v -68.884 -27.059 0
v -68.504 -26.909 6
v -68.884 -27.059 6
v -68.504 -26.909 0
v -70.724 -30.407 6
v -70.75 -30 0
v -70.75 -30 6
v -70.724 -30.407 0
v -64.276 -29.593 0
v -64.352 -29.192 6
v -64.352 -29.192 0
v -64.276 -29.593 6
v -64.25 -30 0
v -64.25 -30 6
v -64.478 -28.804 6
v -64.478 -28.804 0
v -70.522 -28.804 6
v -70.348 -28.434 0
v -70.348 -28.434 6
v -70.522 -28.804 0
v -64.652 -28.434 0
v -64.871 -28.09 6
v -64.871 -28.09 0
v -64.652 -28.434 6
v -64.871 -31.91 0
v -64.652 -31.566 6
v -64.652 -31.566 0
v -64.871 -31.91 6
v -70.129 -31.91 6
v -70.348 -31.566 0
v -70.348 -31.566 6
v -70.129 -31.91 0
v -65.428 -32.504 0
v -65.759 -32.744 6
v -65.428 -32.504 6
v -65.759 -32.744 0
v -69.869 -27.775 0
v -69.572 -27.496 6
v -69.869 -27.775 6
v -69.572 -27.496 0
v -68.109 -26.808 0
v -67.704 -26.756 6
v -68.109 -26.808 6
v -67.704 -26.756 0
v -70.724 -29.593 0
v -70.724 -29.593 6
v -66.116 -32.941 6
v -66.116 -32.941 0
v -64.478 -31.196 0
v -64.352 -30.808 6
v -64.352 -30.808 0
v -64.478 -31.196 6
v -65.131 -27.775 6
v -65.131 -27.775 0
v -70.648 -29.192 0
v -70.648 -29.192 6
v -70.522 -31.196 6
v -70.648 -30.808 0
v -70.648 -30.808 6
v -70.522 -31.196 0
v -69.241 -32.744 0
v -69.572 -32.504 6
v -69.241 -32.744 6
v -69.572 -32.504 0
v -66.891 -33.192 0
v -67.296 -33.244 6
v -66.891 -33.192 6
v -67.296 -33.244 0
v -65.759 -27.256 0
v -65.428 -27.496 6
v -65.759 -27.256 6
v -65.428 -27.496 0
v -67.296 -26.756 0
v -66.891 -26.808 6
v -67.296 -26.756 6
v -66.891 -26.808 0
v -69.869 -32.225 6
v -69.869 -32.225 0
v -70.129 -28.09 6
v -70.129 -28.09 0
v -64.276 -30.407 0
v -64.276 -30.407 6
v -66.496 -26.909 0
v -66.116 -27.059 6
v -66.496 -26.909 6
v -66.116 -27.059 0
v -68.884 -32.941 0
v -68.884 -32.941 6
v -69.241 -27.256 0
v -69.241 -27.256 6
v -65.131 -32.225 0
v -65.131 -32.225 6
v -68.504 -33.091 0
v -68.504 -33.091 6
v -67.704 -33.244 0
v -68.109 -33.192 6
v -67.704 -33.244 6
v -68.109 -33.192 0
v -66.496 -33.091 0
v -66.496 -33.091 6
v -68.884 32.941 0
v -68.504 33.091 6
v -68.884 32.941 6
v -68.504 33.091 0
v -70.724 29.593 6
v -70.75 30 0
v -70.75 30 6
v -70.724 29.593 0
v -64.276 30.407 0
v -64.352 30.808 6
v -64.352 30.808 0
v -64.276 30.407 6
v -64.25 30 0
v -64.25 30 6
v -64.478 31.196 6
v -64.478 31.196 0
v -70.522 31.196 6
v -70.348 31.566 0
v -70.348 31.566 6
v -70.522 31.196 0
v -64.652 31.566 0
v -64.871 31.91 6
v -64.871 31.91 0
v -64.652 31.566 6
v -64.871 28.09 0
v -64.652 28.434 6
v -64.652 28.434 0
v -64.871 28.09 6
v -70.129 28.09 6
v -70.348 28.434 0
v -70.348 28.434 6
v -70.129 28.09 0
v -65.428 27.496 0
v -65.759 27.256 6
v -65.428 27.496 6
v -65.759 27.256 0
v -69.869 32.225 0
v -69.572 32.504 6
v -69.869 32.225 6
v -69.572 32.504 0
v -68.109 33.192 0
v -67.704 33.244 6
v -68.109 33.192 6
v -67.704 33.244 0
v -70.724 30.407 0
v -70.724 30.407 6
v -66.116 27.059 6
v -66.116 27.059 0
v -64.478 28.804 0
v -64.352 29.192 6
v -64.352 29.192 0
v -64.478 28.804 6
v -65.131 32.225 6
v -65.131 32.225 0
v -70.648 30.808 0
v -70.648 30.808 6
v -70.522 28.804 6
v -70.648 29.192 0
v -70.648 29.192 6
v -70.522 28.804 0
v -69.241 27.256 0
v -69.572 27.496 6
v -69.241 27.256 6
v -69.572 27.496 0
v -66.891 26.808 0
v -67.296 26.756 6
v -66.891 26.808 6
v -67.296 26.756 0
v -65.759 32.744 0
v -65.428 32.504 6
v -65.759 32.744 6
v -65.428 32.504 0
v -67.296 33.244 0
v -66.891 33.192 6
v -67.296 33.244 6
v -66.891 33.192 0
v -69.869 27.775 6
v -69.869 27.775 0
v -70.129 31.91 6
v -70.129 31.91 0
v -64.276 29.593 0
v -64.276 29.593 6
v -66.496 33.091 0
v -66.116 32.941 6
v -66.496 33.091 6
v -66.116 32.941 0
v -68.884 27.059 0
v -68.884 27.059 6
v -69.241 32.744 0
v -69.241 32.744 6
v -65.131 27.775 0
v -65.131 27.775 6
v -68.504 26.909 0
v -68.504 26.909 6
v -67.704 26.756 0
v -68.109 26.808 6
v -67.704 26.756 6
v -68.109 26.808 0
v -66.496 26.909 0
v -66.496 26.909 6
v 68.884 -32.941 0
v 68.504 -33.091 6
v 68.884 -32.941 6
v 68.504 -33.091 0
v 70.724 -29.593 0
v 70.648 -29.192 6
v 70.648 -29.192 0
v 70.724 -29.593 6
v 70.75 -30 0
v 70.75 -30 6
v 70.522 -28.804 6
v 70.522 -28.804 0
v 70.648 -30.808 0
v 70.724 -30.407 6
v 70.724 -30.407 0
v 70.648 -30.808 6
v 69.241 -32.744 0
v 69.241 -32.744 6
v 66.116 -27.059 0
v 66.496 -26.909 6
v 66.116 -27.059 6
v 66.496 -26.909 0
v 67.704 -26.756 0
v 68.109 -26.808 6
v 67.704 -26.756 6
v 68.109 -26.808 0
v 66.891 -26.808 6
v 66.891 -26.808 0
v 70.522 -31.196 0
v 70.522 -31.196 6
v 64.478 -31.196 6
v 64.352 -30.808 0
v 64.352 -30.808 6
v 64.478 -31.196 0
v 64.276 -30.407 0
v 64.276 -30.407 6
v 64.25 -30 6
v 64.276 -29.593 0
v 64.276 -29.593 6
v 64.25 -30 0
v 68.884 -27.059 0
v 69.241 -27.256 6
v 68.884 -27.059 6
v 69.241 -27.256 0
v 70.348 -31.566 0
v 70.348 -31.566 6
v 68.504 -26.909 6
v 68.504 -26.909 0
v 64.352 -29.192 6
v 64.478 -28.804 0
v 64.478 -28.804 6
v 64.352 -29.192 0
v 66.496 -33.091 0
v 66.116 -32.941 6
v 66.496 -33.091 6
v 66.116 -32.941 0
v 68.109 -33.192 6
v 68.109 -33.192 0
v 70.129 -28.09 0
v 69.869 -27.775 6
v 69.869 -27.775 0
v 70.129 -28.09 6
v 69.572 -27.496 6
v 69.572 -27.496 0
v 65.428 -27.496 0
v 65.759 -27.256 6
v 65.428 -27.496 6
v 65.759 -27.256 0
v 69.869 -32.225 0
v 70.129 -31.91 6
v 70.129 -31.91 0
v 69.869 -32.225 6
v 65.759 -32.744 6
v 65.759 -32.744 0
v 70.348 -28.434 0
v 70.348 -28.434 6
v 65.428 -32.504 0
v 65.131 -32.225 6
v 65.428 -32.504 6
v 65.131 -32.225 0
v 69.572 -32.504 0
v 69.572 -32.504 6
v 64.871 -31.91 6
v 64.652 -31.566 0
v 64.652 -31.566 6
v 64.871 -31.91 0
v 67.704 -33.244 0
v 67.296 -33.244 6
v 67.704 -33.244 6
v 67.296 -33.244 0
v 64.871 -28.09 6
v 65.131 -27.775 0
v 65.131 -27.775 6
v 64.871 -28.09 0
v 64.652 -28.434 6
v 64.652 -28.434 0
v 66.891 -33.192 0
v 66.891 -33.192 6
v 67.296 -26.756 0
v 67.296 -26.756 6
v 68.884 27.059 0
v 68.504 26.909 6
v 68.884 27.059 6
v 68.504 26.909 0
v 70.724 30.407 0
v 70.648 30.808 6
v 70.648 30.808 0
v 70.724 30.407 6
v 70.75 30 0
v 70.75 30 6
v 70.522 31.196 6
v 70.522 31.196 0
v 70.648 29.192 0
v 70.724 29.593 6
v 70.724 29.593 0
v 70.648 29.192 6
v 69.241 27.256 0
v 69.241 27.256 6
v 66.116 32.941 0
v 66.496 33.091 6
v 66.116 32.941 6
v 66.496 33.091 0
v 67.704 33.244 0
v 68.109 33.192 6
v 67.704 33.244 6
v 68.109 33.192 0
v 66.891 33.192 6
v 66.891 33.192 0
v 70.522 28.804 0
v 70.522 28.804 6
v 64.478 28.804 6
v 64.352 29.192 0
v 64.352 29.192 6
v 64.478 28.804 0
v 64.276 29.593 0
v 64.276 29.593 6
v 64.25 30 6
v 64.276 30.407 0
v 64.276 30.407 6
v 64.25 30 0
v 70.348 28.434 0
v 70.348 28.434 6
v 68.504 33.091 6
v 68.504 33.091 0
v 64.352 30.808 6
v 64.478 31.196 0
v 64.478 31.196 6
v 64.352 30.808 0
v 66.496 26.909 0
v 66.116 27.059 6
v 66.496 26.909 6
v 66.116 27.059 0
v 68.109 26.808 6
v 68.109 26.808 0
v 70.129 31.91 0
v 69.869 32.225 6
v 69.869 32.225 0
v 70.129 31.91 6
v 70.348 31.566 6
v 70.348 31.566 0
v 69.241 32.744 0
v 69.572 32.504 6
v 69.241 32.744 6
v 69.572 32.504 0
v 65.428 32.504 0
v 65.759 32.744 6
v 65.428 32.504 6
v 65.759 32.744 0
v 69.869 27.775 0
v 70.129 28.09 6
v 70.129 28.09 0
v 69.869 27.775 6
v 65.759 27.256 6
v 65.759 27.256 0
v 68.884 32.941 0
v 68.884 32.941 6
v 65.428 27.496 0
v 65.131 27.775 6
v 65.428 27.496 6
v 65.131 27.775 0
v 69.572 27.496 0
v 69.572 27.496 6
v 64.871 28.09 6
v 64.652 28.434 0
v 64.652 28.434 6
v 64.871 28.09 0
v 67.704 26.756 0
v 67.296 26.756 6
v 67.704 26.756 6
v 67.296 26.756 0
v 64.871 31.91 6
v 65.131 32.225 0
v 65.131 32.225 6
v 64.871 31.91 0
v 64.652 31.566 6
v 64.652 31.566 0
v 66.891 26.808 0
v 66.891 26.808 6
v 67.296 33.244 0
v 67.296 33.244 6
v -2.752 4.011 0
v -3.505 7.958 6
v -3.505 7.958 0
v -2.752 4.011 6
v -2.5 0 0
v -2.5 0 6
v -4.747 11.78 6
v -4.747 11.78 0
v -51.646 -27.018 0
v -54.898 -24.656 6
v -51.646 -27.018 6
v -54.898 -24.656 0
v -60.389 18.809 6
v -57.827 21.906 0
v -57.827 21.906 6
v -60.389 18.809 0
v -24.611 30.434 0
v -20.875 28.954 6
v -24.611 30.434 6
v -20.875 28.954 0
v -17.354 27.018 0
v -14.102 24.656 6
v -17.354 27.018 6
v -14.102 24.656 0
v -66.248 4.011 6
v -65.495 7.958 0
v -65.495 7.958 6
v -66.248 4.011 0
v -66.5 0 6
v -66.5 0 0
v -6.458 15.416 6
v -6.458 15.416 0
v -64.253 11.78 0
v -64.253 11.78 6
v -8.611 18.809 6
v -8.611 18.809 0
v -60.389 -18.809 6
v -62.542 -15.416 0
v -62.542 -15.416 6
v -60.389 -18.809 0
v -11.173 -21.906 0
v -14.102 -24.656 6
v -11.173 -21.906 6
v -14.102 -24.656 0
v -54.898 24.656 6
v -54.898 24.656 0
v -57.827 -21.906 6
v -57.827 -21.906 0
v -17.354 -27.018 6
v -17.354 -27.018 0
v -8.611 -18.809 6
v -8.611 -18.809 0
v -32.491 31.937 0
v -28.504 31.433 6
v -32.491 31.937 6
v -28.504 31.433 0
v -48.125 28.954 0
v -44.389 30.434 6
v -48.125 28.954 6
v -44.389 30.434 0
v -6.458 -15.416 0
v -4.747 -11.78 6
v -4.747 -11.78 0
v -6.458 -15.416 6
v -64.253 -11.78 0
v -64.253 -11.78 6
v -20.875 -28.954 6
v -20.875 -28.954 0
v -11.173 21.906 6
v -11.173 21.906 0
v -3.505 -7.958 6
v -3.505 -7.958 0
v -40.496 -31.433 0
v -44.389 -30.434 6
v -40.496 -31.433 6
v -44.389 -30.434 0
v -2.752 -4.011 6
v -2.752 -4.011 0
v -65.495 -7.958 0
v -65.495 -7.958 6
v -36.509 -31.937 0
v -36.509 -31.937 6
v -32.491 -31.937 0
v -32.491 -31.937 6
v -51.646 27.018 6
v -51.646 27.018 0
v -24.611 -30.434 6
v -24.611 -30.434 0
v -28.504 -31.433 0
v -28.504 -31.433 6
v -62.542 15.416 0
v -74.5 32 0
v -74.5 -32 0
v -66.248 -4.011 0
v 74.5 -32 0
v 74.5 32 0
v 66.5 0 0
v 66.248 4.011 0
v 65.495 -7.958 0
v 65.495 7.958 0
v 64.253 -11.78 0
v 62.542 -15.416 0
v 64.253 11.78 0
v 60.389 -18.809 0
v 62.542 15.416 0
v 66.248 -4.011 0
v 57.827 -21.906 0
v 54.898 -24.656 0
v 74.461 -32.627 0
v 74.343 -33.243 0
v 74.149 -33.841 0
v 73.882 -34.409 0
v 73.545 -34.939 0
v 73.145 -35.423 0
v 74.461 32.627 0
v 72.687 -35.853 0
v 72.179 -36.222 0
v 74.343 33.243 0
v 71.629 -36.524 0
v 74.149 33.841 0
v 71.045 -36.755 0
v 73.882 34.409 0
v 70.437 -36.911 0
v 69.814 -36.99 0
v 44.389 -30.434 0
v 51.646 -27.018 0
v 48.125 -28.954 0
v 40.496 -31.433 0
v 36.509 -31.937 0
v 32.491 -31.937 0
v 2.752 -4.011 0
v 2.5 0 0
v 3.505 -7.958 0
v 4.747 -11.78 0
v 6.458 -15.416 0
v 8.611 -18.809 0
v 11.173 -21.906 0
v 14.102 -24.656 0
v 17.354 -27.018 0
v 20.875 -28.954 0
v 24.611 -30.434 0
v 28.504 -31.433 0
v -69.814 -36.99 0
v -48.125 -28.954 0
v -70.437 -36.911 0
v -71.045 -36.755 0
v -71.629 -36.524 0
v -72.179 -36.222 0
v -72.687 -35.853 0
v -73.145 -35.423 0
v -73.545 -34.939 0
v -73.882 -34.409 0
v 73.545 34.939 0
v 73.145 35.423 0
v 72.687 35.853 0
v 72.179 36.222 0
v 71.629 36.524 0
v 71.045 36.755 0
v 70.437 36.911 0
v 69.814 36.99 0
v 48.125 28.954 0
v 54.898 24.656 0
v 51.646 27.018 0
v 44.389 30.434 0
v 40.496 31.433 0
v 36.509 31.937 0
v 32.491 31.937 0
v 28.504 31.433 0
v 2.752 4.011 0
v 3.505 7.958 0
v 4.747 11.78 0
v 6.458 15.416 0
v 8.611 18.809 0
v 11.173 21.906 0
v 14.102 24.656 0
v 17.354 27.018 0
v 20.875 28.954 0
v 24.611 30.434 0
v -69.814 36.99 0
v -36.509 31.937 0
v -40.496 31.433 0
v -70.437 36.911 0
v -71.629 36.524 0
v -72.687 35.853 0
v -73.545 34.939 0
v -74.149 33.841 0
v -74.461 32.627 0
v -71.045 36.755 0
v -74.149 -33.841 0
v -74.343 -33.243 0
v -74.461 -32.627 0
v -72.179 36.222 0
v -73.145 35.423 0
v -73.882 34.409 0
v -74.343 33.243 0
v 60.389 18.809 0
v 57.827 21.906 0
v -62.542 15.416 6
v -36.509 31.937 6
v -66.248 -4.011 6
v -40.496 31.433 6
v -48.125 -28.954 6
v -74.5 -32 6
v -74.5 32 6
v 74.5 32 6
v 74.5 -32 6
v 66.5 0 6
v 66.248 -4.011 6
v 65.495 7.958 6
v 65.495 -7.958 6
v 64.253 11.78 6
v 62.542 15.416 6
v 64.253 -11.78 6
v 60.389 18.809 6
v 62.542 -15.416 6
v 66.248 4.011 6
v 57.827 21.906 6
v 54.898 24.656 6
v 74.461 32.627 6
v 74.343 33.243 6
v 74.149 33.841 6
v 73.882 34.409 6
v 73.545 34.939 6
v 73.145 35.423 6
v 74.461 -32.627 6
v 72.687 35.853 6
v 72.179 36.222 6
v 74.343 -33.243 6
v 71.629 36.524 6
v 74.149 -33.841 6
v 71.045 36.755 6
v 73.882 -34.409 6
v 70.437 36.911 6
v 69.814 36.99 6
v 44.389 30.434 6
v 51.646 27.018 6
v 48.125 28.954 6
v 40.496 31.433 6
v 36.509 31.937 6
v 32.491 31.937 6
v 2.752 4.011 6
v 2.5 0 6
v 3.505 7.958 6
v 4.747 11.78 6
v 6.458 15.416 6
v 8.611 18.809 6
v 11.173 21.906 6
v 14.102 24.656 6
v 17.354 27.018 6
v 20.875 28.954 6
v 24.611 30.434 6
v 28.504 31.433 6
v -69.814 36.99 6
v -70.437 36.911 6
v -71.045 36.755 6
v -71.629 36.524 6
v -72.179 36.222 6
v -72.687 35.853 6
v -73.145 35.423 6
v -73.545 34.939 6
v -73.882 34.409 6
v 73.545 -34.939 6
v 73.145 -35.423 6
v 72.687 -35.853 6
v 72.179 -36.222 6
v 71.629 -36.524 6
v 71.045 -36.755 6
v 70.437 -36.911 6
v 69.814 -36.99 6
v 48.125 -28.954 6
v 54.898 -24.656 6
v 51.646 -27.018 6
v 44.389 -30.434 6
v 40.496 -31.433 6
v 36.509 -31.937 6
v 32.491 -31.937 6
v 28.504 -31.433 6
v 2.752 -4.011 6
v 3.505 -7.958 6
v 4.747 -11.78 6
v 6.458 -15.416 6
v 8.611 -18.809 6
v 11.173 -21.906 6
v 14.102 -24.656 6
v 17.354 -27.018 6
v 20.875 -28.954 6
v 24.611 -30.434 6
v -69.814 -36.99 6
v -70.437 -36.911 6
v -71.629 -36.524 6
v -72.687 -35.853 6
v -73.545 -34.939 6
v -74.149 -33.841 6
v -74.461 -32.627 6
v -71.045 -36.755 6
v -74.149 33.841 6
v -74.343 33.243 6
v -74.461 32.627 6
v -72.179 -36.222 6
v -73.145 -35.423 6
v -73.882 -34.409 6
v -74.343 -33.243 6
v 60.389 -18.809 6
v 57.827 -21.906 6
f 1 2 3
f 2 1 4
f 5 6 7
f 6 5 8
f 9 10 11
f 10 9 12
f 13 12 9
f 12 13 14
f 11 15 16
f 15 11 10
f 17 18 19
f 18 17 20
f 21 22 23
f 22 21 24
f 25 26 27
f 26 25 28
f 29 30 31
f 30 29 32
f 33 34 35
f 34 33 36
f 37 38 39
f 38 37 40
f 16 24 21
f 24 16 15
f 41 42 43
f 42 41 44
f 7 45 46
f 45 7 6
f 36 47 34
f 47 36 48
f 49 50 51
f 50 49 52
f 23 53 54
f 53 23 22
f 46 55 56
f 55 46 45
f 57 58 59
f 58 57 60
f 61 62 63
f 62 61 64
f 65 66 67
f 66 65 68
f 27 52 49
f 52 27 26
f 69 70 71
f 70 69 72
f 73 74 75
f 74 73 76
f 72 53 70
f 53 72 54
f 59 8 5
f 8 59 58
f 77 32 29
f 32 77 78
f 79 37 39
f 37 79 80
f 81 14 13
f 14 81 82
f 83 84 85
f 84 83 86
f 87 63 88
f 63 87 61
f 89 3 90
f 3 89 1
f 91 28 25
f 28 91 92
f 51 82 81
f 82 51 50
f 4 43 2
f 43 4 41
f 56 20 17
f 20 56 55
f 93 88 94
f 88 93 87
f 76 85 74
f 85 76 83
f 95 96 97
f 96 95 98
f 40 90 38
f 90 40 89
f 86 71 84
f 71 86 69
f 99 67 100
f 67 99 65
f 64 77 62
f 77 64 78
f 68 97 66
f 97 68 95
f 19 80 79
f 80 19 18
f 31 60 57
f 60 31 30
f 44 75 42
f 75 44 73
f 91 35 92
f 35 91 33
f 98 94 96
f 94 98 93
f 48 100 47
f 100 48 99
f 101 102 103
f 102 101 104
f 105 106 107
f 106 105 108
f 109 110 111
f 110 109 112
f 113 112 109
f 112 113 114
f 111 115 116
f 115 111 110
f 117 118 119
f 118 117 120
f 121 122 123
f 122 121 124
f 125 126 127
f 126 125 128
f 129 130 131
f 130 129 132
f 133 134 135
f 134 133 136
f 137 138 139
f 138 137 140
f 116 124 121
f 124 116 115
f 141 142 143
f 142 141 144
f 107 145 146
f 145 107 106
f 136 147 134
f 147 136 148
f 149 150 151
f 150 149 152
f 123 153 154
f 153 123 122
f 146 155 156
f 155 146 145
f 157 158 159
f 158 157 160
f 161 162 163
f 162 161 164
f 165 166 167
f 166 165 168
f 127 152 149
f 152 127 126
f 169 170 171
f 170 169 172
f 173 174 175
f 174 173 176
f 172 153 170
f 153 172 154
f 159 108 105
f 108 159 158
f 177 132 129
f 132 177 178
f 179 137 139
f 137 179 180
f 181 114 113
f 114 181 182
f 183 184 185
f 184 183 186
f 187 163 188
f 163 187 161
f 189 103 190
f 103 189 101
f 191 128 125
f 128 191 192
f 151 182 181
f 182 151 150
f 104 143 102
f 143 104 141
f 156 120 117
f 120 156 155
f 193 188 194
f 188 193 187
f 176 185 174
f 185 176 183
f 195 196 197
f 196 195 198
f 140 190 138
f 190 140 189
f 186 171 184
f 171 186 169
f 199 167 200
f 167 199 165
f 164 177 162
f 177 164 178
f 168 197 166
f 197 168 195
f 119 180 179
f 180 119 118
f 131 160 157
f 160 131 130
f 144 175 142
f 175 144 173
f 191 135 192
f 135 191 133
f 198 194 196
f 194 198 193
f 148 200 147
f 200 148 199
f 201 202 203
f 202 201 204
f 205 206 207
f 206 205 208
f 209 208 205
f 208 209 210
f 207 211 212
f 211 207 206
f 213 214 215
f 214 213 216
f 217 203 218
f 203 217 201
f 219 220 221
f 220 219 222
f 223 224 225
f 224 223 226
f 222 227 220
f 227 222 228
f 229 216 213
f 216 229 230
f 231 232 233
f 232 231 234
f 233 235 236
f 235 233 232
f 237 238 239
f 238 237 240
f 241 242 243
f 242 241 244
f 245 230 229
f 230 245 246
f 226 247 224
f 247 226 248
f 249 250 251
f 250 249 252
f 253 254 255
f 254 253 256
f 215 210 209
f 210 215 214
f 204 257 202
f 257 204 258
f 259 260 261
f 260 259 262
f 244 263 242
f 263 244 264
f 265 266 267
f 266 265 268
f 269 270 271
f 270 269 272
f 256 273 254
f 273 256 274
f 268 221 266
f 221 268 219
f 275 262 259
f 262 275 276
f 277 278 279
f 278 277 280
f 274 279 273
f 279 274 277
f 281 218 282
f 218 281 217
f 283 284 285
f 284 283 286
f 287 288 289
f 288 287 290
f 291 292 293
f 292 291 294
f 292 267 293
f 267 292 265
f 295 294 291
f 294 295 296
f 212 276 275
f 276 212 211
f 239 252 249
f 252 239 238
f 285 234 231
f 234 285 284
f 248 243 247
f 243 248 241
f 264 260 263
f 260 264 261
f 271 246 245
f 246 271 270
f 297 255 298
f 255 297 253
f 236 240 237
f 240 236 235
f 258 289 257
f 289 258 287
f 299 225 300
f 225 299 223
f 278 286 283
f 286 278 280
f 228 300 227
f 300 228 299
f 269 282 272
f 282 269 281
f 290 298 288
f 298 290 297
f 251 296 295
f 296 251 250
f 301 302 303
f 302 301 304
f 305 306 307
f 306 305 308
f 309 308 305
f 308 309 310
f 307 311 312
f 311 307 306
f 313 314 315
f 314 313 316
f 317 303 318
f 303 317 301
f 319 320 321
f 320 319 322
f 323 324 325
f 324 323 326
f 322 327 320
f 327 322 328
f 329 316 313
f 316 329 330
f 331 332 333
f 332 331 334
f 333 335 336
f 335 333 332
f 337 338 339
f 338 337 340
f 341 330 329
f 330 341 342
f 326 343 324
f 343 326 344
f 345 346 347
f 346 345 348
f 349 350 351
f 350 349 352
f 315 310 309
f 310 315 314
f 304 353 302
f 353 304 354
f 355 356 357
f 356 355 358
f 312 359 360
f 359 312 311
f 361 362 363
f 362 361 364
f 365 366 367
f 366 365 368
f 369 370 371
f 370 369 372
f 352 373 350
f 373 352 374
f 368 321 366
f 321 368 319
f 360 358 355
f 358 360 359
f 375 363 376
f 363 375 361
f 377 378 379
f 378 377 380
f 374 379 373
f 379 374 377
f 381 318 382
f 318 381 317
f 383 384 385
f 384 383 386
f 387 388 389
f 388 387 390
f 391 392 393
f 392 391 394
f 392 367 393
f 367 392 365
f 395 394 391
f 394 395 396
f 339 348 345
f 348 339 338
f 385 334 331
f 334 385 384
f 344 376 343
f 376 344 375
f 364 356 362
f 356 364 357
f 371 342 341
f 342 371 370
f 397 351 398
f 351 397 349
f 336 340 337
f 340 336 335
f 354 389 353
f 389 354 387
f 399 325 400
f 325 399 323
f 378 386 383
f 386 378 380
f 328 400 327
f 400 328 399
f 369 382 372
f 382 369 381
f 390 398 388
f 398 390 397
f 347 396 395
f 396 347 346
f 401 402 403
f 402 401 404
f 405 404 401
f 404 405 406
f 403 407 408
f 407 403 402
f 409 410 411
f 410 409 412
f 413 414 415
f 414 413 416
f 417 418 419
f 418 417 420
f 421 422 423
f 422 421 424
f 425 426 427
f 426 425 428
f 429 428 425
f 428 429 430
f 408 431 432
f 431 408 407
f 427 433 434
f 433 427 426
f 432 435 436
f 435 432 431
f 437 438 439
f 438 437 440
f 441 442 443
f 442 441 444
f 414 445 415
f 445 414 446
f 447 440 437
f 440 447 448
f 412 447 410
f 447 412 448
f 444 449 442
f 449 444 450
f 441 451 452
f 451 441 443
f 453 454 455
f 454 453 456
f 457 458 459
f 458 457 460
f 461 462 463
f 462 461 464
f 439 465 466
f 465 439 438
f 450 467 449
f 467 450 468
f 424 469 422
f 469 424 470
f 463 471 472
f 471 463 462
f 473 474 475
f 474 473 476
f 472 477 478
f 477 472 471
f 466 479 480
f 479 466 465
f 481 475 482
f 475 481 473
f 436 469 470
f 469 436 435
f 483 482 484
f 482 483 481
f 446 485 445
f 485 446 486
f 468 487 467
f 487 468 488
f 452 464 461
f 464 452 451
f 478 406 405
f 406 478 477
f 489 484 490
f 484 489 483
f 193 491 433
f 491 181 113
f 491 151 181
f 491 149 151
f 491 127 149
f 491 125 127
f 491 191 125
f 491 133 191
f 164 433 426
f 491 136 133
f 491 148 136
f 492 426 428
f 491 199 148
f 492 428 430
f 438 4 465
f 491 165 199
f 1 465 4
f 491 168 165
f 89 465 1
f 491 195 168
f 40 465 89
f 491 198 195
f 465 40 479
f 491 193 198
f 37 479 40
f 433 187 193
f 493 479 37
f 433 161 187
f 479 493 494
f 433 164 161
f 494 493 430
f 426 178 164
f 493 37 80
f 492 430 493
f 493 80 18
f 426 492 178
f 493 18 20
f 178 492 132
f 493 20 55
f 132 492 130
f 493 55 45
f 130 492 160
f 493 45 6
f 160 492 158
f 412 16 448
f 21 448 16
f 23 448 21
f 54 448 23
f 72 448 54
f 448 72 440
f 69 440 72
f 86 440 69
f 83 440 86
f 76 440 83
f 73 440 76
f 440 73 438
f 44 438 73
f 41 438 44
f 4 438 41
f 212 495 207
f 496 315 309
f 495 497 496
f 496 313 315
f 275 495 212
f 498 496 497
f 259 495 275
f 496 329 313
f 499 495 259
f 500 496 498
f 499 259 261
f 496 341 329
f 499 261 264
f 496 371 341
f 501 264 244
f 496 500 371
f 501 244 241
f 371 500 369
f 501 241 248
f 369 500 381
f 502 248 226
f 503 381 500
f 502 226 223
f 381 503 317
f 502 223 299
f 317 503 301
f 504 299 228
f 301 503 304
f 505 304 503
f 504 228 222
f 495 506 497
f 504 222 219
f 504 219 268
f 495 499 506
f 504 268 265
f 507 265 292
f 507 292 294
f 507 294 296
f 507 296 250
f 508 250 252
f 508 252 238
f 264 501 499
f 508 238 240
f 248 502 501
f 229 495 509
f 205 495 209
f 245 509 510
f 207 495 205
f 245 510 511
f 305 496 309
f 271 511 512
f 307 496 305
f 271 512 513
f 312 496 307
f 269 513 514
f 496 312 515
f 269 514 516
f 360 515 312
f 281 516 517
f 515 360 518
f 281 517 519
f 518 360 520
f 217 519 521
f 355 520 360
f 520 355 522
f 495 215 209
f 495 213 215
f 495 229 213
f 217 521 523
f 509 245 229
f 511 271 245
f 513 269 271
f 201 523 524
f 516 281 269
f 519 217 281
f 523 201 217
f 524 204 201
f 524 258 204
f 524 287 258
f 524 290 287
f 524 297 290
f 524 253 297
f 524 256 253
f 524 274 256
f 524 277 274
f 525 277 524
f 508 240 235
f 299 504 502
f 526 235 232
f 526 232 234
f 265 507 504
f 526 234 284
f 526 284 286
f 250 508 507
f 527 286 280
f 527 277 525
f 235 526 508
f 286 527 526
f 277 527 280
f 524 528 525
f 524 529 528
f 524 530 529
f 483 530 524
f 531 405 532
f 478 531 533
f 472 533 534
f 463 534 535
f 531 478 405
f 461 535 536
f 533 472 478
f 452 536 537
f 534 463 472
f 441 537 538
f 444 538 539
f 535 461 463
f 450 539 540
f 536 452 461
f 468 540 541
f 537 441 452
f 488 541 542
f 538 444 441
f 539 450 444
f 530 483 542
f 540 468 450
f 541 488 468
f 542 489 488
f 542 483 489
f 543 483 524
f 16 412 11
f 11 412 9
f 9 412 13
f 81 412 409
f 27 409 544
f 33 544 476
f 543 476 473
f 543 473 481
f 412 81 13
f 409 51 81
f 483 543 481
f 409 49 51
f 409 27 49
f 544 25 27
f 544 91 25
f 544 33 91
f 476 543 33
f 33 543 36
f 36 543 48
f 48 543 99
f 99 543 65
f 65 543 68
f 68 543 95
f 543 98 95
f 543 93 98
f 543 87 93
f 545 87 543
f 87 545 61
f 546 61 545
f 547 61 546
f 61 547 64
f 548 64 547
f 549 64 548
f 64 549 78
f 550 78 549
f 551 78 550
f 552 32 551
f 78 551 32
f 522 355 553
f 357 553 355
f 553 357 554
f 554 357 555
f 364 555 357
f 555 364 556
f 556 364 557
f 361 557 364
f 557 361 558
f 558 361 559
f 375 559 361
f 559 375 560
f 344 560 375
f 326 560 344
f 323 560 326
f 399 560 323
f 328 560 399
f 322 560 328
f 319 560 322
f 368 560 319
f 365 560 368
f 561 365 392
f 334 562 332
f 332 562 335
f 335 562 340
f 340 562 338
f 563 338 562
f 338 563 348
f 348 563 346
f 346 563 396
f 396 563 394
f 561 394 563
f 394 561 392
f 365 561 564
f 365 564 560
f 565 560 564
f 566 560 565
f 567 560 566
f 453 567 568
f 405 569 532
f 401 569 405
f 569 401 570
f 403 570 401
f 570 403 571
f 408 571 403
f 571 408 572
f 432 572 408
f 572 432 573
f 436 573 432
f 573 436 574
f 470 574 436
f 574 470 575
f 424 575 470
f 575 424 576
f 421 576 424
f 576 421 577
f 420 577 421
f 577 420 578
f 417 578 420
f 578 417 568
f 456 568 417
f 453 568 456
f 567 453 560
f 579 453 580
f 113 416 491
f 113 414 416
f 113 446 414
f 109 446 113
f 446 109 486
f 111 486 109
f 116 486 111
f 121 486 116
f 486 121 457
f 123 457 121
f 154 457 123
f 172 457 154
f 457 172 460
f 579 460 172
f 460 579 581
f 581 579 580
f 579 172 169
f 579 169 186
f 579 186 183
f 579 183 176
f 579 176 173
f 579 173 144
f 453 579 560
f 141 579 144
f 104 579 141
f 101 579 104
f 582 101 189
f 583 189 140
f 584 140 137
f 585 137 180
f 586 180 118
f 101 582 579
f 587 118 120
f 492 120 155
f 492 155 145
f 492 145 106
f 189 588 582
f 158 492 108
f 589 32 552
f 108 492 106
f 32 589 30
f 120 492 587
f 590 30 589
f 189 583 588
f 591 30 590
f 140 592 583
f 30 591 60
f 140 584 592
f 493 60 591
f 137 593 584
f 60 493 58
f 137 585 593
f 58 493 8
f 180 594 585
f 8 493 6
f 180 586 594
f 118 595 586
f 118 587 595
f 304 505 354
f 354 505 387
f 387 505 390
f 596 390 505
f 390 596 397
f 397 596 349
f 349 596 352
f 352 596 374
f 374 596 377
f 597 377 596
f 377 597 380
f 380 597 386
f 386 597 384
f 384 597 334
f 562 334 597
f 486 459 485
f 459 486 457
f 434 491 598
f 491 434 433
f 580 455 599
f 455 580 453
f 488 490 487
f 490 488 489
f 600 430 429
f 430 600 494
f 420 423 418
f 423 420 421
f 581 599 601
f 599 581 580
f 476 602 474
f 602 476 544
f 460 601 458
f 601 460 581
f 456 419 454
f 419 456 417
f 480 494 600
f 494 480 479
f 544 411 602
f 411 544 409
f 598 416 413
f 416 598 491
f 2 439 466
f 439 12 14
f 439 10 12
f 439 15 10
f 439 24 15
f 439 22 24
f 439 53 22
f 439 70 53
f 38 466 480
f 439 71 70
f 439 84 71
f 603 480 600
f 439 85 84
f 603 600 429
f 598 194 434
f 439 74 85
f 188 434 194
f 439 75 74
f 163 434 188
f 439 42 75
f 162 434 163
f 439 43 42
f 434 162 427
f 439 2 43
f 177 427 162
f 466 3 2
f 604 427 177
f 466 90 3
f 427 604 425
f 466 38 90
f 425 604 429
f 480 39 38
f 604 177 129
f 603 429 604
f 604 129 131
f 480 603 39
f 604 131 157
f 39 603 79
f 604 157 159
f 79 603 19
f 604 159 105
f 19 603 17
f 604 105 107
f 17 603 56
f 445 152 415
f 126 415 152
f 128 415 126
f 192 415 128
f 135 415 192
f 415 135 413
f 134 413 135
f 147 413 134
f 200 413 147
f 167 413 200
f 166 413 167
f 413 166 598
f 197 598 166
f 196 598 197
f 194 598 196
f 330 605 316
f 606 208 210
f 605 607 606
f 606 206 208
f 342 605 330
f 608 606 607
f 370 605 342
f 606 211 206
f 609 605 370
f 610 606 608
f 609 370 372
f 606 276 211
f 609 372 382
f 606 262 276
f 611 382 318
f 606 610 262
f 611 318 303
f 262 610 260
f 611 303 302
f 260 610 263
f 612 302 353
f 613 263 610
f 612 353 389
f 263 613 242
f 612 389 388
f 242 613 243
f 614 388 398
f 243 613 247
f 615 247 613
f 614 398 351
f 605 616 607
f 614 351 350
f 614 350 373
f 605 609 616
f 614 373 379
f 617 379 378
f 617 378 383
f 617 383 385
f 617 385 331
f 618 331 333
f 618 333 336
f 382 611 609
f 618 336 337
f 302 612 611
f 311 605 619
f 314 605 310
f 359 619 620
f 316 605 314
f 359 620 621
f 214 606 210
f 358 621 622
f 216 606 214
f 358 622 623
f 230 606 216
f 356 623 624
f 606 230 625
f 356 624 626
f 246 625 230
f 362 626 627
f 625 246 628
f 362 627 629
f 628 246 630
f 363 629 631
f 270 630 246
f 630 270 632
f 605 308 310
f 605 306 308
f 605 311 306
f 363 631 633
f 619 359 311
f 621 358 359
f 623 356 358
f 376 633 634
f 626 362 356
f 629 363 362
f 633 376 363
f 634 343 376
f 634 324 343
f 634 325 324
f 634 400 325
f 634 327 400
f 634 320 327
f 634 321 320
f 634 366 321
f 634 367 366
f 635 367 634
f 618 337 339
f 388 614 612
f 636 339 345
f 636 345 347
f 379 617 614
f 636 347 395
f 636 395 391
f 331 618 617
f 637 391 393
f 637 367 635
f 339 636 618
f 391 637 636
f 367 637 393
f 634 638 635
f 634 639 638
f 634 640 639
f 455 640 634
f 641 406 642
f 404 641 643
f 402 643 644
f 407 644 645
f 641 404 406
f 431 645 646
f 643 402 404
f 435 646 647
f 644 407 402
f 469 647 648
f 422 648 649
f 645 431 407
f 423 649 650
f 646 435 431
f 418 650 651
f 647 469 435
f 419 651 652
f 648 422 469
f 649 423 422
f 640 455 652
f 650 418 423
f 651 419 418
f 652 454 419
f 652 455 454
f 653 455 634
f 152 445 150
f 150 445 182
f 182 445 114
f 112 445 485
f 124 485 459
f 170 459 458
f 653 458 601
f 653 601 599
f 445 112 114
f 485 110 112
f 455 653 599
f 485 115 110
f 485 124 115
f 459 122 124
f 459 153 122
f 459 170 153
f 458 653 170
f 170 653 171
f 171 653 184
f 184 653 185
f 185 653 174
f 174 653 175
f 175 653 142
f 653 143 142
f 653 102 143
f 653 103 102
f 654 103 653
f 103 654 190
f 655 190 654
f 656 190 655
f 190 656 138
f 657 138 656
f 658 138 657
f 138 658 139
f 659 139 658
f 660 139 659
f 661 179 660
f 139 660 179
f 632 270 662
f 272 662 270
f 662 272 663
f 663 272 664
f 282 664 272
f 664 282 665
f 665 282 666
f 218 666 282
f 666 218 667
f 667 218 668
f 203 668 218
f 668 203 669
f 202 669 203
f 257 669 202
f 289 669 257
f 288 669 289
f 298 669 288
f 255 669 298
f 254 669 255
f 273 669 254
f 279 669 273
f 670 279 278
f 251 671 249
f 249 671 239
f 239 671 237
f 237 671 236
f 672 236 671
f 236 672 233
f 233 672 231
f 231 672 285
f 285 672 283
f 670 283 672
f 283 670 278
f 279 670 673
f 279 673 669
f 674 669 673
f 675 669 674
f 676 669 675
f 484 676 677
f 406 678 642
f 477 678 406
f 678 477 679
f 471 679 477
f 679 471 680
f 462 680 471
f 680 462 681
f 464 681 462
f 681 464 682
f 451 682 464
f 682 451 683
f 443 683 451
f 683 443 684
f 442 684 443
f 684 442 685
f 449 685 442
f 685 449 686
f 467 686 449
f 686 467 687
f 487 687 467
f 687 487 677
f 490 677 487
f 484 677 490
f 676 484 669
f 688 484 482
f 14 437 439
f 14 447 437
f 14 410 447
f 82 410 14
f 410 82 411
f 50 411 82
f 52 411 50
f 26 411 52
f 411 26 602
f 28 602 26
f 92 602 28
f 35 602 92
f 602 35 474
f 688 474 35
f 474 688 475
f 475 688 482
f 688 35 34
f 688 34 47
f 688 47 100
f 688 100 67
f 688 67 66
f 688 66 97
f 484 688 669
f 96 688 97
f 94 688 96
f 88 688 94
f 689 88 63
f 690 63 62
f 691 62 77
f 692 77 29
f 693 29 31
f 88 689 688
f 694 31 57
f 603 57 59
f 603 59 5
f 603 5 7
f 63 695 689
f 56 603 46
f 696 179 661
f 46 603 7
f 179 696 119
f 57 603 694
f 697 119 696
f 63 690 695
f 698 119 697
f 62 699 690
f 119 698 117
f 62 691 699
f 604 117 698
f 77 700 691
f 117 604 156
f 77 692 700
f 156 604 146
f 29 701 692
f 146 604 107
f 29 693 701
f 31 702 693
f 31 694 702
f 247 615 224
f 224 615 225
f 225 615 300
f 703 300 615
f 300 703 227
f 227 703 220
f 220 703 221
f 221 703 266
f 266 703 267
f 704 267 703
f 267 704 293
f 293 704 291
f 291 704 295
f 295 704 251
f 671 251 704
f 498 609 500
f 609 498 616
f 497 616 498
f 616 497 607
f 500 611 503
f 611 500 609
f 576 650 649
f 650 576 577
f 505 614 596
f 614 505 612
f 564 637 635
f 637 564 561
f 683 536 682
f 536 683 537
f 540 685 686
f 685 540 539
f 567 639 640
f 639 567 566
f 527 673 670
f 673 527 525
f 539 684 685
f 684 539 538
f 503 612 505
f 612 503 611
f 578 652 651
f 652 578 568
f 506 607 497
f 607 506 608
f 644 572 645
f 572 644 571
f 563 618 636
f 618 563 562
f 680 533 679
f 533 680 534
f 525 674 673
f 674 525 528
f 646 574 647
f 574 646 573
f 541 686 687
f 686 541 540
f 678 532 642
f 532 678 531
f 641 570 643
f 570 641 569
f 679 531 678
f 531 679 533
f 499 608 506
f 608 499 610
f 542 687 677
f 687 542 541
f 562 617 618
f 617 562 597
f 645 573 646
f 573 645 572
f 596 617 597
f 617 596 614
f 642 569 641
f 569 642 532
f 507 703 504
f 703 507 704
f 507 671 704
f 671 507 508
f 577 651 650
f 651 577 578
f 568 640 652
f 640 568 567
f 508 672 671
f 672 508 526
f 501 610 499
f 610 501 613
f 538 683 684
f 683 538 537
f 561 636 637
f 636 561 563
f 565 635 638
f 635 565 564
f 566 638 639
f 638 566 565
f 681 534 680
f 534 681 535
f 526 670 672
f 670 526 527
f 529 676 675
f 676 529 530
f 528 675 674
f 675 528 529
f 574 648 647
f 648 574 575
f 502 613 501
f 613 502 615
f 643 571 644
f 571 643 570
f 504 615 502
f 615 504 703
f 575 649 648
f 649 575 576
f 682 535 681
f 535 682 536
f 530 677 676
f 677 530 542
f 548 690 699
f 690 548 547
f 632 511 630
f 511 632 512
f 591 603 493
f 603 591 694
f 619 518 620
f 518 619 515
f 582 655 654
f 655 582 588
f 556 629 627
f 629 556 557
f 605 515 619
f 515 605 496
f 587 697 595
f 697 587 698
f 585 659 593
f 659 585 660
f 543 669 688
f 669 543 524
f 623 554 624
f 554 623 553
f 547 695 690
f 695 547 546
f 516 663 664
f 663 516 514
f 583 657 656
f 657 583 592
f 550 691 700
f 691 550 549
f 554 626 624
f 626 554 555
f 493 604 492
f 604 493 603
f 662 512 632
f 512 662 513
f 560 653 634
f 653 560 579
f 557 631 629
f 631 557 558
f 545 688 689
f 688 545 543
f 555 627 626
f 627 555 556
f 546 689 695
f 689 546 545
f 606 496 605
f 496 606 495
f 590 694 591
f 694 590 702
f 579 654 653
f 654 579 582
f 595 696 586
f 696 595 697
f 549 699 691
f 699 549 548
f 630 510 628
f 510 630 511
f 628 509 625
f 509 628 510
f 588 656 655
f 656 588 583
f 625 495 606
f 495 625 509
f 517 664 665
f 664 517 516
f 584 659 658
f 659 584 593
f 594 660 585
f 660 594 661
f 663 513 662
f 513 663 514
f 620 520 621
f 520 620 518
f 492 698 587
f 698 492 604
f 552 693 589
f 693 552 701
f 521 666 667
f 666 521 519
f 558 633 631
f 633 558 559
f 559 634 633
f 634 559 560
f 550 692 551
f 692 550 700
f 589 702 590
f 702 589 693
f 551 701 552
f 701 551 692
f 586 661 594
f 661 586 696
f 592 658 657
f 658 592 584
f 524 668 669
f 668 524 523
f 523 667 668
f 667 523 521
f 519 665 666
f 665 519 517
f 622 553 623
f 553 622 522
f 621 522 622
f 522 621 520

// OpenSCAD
$fn = 50;


difference() {
	union() {
		hull() {
			translate(v = [-69.5000000000, 32.0000000000, 0]) {
				cylinder(h = 6, r = 5);
			}
			translate(v = [69.5000000000, 32.0000000000, 0]) {
				cylinder(h = 6, r = 5);
			}
			translate(v = [-69.5000000000, -32.0000000000, 0]) {
				cylinder(h = 6, r = 5);
			}
			translate(v = [69.5000000000, -32.0000000000, 0]) {
				cylinder(h = 6, r = 5);
			}
		}
	}
	union() {
		#translate(v = [-67.5000000000, -30.0000000000, -100.0000000000]) {
			cylinder(h = 200, r = 3.2500000000);
		}
		#translate(v = [-67.5000000000, 30.0000000000, -100.0000000000]) {
			cylinder(h = 200, r = 3.2500000000);
		}
		#translate(v = [67.5000000000, -30.0000000000, -100.0000000000]) {
			cylinder(h = 200, r = 3.2500000000);
		}
		#translate(v = [67.5000000000, 30.0000000000, -100.0000000000]) {
			cylinder(h = 200, r = 3.2500000000);
		}
		#translate(v = [-34.5000000000, 0, 0]) {
			cylinder(h = 6, r = 32.0000000000);
		}
		#translate(v = [34.5000000000, 0, 0]) {
			cylinder(h = 6, r = 32.0000000000);
		}
	}
}
